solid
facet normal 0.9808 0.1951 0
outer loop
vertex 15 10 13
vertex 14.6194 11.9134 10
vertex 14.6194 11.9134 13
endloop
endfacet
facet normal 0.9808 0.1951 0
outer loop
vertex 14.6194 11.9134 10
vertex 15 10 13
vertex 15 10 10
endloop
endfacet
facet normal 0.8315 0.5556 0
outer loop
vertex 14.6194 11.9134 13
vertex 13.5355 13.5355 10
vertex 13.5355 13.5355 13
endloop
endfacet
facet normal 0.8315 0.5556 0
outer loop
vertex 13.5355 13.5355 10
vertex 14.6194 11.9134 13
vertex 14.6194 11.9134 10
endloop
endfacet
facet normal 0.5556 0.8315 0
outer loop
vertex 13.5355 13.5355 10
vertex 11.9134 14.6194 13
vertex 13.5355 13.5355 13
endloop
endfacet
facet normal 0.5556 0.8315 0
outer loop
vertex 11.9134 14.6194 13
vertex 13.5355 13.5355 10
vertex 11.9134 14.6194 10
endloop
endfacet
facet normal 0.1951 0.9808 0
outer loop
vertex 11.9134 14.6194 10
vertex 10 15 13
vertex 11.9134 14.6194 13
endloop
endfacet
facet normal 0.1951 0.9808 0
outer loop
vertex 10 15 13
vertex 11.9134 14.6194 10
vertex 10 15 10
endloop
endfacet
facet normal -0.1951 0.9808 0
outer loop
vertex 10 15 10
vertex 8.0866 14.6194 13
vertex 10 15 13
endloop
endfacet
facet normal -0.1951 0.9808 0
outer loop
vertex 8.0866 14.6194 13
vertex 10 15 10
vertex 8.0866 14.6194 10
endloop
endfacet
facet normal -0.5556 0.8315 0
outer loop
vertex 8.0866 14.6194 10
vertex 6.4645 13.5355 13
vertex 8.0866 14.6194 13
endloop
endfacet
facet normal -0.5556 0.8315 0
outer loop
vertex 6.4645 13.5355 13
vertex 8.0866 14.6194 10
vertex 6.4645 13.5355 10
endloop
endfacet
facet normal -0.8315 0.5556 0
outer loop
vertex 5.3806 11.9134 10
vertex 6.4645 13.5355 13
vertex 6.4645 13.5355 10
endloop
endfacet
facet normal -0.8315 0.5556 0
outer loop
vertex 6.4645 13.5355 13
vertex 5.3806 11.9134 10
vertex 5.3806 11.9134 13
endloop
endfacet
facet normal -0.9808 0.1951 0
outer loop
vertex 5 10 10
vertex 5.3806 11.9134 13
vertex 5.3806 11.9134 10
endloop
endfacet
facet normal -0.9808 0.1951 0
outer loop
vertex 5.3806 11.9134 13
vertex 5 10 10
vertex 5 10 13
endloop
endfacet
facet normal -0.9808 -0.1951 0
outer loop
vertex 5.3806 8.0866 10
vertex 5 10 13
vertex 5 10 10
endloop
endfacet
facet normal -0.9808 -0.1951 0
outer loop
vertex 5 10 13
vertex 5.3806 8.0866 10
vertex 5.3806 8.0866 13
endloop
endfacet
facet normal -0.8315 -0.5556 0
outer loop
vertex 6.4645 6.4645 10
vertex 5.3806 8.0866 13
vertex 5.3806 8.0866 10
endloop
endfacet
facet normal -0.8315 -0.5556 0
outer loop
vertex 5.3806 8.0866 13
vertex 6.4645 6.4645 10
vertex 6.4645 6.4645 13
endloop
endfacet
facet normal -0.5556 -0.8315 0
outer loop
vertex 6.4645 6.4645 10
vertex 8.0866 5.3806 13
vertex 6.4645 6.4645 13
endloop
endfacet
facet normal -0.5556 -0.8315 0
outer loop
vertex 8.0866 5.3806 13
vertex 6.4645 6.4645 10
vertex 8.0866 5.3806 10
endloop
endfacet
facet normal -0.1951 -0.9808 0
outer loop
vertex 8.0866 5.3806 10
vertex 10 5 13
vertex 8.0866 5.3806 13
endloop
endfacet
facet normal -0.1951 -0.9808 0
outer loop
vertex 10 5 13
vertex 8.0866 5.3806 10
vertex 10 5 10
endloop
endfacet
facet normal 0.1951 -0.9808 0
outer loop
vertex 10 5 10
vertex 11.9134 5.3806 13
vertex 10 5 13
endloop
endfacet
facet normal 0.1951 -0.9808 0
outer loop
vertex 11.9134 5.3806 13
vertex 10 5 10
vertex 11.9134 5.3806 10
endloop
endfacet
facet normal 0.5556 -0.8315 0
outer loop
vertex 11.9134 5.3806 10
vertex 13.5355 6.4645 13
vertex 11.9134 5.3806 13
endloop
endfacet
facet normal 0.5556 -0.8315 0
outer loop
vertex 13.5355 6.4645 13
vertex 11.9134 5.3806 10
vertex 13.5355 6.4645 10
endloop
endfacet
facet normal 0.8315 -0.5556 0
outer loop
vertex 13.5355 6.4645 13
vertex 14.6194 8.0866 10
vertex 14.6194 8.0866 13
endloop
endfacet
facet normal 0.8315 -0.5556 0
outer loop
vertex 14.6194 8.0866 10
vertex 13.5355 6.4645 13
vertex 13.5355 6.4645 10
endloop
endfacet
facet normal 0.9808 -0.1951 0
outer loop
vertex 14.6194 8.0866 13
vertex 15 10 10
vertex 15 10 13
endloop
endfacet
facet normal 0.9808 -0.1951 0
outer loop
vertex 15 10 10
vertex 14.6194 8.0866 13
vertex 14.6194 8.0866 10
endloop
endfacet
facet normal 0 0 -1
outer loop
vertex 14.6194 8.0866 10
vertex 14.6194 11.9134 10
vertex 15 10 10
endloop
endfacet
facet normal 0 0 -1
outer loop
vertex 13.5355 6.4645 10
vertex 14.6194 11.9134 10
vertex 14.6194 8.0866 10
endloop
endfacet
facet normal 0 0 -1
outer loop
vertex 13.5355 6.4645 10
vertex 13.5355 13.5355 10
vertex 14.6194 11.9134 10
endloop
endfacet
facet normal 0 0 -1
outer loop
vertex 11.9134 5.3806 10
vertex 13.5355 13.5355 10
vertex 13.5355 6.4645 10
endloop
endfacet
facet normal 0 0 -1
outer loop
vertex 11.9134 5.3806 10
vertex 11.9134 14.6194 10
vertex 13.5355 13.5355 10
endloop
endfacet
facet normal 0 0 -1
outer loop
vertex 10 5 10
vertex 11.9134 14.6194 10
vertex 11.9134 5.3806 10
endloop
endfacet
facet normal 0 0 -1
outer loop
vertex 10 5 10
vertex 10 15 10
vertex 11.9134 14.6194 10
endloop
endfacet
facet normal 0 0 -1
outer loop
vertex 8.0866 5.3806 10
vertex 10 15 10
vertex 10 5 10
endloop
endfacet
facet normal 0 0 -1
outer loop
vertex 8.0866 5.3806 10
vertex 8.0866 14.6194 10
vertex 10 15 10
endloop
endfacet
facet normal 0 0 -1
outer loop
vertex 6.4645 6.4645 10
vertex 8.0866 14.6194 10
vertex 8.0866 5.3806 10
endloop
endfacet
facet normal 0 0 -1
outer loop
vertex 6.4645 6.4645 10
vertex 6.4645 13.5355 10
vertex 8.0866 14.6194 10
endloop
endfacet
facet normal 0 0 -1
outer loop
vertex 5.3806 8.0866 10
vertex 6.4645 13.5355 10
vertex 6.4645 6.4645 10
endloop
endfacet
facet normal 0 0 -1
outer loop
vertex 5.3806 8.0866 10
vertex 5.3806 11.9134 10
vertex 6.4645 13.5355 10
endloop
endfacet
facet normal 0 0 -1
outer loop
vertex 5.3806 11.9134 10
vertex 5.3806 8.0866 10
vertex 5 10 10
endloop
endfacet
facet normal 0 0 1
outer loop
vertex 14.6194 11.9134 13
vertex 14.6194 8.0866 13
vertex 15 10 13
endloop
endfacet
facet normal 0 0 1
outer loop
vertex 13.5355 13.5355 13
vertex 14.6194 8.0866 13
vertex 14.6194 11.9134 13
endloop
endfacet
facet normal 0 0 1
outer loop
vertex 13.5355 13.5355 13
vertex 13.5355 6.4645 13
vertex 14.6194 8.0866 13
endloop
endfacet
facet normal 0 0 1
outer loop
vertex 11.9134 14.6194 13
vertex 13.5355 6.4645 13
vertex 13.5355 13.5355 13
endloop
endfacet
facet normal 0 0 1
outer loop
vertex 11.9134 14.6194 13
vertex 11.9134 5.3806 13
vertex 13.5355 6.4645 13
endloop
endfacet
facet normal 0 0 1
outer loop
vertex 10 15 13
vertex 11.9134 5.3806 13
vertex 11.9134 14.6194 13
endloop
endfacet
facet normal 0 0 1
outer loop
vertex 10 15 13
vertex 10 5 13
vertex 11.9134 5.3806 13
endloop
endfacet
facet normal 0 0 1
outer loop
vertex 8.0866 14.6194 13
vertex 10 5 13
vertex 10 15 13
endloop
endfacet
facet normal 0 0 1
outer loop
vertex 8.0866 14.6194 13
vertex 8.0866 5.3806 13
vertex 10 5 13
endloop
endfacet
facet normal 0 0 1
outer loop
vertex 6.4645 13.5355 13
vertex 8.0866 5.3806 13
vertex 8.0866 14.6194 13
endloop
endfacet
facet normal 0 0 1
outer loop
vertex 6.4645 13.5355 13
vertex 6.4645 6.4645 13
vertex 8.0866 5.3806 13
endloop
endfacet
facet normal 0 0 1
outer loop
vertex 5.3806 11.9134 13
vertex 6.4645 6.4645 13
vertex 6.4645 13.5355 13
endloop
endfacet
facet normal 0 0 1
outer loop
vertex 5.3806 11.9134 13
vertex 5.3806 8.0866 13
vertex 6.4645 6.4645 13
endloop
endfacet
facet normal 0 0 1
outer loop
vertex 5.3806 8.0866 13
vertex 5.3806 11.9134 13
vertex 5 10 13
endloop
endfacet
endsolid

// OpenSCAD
multmatrix(m = [ [1, 0, 0, 10],
                 [0, 1, 0, 10],
                 [0, 0, 1, 10],
                 [0, 0, 0,  1]
               ]) cylinder(3,5,5);
